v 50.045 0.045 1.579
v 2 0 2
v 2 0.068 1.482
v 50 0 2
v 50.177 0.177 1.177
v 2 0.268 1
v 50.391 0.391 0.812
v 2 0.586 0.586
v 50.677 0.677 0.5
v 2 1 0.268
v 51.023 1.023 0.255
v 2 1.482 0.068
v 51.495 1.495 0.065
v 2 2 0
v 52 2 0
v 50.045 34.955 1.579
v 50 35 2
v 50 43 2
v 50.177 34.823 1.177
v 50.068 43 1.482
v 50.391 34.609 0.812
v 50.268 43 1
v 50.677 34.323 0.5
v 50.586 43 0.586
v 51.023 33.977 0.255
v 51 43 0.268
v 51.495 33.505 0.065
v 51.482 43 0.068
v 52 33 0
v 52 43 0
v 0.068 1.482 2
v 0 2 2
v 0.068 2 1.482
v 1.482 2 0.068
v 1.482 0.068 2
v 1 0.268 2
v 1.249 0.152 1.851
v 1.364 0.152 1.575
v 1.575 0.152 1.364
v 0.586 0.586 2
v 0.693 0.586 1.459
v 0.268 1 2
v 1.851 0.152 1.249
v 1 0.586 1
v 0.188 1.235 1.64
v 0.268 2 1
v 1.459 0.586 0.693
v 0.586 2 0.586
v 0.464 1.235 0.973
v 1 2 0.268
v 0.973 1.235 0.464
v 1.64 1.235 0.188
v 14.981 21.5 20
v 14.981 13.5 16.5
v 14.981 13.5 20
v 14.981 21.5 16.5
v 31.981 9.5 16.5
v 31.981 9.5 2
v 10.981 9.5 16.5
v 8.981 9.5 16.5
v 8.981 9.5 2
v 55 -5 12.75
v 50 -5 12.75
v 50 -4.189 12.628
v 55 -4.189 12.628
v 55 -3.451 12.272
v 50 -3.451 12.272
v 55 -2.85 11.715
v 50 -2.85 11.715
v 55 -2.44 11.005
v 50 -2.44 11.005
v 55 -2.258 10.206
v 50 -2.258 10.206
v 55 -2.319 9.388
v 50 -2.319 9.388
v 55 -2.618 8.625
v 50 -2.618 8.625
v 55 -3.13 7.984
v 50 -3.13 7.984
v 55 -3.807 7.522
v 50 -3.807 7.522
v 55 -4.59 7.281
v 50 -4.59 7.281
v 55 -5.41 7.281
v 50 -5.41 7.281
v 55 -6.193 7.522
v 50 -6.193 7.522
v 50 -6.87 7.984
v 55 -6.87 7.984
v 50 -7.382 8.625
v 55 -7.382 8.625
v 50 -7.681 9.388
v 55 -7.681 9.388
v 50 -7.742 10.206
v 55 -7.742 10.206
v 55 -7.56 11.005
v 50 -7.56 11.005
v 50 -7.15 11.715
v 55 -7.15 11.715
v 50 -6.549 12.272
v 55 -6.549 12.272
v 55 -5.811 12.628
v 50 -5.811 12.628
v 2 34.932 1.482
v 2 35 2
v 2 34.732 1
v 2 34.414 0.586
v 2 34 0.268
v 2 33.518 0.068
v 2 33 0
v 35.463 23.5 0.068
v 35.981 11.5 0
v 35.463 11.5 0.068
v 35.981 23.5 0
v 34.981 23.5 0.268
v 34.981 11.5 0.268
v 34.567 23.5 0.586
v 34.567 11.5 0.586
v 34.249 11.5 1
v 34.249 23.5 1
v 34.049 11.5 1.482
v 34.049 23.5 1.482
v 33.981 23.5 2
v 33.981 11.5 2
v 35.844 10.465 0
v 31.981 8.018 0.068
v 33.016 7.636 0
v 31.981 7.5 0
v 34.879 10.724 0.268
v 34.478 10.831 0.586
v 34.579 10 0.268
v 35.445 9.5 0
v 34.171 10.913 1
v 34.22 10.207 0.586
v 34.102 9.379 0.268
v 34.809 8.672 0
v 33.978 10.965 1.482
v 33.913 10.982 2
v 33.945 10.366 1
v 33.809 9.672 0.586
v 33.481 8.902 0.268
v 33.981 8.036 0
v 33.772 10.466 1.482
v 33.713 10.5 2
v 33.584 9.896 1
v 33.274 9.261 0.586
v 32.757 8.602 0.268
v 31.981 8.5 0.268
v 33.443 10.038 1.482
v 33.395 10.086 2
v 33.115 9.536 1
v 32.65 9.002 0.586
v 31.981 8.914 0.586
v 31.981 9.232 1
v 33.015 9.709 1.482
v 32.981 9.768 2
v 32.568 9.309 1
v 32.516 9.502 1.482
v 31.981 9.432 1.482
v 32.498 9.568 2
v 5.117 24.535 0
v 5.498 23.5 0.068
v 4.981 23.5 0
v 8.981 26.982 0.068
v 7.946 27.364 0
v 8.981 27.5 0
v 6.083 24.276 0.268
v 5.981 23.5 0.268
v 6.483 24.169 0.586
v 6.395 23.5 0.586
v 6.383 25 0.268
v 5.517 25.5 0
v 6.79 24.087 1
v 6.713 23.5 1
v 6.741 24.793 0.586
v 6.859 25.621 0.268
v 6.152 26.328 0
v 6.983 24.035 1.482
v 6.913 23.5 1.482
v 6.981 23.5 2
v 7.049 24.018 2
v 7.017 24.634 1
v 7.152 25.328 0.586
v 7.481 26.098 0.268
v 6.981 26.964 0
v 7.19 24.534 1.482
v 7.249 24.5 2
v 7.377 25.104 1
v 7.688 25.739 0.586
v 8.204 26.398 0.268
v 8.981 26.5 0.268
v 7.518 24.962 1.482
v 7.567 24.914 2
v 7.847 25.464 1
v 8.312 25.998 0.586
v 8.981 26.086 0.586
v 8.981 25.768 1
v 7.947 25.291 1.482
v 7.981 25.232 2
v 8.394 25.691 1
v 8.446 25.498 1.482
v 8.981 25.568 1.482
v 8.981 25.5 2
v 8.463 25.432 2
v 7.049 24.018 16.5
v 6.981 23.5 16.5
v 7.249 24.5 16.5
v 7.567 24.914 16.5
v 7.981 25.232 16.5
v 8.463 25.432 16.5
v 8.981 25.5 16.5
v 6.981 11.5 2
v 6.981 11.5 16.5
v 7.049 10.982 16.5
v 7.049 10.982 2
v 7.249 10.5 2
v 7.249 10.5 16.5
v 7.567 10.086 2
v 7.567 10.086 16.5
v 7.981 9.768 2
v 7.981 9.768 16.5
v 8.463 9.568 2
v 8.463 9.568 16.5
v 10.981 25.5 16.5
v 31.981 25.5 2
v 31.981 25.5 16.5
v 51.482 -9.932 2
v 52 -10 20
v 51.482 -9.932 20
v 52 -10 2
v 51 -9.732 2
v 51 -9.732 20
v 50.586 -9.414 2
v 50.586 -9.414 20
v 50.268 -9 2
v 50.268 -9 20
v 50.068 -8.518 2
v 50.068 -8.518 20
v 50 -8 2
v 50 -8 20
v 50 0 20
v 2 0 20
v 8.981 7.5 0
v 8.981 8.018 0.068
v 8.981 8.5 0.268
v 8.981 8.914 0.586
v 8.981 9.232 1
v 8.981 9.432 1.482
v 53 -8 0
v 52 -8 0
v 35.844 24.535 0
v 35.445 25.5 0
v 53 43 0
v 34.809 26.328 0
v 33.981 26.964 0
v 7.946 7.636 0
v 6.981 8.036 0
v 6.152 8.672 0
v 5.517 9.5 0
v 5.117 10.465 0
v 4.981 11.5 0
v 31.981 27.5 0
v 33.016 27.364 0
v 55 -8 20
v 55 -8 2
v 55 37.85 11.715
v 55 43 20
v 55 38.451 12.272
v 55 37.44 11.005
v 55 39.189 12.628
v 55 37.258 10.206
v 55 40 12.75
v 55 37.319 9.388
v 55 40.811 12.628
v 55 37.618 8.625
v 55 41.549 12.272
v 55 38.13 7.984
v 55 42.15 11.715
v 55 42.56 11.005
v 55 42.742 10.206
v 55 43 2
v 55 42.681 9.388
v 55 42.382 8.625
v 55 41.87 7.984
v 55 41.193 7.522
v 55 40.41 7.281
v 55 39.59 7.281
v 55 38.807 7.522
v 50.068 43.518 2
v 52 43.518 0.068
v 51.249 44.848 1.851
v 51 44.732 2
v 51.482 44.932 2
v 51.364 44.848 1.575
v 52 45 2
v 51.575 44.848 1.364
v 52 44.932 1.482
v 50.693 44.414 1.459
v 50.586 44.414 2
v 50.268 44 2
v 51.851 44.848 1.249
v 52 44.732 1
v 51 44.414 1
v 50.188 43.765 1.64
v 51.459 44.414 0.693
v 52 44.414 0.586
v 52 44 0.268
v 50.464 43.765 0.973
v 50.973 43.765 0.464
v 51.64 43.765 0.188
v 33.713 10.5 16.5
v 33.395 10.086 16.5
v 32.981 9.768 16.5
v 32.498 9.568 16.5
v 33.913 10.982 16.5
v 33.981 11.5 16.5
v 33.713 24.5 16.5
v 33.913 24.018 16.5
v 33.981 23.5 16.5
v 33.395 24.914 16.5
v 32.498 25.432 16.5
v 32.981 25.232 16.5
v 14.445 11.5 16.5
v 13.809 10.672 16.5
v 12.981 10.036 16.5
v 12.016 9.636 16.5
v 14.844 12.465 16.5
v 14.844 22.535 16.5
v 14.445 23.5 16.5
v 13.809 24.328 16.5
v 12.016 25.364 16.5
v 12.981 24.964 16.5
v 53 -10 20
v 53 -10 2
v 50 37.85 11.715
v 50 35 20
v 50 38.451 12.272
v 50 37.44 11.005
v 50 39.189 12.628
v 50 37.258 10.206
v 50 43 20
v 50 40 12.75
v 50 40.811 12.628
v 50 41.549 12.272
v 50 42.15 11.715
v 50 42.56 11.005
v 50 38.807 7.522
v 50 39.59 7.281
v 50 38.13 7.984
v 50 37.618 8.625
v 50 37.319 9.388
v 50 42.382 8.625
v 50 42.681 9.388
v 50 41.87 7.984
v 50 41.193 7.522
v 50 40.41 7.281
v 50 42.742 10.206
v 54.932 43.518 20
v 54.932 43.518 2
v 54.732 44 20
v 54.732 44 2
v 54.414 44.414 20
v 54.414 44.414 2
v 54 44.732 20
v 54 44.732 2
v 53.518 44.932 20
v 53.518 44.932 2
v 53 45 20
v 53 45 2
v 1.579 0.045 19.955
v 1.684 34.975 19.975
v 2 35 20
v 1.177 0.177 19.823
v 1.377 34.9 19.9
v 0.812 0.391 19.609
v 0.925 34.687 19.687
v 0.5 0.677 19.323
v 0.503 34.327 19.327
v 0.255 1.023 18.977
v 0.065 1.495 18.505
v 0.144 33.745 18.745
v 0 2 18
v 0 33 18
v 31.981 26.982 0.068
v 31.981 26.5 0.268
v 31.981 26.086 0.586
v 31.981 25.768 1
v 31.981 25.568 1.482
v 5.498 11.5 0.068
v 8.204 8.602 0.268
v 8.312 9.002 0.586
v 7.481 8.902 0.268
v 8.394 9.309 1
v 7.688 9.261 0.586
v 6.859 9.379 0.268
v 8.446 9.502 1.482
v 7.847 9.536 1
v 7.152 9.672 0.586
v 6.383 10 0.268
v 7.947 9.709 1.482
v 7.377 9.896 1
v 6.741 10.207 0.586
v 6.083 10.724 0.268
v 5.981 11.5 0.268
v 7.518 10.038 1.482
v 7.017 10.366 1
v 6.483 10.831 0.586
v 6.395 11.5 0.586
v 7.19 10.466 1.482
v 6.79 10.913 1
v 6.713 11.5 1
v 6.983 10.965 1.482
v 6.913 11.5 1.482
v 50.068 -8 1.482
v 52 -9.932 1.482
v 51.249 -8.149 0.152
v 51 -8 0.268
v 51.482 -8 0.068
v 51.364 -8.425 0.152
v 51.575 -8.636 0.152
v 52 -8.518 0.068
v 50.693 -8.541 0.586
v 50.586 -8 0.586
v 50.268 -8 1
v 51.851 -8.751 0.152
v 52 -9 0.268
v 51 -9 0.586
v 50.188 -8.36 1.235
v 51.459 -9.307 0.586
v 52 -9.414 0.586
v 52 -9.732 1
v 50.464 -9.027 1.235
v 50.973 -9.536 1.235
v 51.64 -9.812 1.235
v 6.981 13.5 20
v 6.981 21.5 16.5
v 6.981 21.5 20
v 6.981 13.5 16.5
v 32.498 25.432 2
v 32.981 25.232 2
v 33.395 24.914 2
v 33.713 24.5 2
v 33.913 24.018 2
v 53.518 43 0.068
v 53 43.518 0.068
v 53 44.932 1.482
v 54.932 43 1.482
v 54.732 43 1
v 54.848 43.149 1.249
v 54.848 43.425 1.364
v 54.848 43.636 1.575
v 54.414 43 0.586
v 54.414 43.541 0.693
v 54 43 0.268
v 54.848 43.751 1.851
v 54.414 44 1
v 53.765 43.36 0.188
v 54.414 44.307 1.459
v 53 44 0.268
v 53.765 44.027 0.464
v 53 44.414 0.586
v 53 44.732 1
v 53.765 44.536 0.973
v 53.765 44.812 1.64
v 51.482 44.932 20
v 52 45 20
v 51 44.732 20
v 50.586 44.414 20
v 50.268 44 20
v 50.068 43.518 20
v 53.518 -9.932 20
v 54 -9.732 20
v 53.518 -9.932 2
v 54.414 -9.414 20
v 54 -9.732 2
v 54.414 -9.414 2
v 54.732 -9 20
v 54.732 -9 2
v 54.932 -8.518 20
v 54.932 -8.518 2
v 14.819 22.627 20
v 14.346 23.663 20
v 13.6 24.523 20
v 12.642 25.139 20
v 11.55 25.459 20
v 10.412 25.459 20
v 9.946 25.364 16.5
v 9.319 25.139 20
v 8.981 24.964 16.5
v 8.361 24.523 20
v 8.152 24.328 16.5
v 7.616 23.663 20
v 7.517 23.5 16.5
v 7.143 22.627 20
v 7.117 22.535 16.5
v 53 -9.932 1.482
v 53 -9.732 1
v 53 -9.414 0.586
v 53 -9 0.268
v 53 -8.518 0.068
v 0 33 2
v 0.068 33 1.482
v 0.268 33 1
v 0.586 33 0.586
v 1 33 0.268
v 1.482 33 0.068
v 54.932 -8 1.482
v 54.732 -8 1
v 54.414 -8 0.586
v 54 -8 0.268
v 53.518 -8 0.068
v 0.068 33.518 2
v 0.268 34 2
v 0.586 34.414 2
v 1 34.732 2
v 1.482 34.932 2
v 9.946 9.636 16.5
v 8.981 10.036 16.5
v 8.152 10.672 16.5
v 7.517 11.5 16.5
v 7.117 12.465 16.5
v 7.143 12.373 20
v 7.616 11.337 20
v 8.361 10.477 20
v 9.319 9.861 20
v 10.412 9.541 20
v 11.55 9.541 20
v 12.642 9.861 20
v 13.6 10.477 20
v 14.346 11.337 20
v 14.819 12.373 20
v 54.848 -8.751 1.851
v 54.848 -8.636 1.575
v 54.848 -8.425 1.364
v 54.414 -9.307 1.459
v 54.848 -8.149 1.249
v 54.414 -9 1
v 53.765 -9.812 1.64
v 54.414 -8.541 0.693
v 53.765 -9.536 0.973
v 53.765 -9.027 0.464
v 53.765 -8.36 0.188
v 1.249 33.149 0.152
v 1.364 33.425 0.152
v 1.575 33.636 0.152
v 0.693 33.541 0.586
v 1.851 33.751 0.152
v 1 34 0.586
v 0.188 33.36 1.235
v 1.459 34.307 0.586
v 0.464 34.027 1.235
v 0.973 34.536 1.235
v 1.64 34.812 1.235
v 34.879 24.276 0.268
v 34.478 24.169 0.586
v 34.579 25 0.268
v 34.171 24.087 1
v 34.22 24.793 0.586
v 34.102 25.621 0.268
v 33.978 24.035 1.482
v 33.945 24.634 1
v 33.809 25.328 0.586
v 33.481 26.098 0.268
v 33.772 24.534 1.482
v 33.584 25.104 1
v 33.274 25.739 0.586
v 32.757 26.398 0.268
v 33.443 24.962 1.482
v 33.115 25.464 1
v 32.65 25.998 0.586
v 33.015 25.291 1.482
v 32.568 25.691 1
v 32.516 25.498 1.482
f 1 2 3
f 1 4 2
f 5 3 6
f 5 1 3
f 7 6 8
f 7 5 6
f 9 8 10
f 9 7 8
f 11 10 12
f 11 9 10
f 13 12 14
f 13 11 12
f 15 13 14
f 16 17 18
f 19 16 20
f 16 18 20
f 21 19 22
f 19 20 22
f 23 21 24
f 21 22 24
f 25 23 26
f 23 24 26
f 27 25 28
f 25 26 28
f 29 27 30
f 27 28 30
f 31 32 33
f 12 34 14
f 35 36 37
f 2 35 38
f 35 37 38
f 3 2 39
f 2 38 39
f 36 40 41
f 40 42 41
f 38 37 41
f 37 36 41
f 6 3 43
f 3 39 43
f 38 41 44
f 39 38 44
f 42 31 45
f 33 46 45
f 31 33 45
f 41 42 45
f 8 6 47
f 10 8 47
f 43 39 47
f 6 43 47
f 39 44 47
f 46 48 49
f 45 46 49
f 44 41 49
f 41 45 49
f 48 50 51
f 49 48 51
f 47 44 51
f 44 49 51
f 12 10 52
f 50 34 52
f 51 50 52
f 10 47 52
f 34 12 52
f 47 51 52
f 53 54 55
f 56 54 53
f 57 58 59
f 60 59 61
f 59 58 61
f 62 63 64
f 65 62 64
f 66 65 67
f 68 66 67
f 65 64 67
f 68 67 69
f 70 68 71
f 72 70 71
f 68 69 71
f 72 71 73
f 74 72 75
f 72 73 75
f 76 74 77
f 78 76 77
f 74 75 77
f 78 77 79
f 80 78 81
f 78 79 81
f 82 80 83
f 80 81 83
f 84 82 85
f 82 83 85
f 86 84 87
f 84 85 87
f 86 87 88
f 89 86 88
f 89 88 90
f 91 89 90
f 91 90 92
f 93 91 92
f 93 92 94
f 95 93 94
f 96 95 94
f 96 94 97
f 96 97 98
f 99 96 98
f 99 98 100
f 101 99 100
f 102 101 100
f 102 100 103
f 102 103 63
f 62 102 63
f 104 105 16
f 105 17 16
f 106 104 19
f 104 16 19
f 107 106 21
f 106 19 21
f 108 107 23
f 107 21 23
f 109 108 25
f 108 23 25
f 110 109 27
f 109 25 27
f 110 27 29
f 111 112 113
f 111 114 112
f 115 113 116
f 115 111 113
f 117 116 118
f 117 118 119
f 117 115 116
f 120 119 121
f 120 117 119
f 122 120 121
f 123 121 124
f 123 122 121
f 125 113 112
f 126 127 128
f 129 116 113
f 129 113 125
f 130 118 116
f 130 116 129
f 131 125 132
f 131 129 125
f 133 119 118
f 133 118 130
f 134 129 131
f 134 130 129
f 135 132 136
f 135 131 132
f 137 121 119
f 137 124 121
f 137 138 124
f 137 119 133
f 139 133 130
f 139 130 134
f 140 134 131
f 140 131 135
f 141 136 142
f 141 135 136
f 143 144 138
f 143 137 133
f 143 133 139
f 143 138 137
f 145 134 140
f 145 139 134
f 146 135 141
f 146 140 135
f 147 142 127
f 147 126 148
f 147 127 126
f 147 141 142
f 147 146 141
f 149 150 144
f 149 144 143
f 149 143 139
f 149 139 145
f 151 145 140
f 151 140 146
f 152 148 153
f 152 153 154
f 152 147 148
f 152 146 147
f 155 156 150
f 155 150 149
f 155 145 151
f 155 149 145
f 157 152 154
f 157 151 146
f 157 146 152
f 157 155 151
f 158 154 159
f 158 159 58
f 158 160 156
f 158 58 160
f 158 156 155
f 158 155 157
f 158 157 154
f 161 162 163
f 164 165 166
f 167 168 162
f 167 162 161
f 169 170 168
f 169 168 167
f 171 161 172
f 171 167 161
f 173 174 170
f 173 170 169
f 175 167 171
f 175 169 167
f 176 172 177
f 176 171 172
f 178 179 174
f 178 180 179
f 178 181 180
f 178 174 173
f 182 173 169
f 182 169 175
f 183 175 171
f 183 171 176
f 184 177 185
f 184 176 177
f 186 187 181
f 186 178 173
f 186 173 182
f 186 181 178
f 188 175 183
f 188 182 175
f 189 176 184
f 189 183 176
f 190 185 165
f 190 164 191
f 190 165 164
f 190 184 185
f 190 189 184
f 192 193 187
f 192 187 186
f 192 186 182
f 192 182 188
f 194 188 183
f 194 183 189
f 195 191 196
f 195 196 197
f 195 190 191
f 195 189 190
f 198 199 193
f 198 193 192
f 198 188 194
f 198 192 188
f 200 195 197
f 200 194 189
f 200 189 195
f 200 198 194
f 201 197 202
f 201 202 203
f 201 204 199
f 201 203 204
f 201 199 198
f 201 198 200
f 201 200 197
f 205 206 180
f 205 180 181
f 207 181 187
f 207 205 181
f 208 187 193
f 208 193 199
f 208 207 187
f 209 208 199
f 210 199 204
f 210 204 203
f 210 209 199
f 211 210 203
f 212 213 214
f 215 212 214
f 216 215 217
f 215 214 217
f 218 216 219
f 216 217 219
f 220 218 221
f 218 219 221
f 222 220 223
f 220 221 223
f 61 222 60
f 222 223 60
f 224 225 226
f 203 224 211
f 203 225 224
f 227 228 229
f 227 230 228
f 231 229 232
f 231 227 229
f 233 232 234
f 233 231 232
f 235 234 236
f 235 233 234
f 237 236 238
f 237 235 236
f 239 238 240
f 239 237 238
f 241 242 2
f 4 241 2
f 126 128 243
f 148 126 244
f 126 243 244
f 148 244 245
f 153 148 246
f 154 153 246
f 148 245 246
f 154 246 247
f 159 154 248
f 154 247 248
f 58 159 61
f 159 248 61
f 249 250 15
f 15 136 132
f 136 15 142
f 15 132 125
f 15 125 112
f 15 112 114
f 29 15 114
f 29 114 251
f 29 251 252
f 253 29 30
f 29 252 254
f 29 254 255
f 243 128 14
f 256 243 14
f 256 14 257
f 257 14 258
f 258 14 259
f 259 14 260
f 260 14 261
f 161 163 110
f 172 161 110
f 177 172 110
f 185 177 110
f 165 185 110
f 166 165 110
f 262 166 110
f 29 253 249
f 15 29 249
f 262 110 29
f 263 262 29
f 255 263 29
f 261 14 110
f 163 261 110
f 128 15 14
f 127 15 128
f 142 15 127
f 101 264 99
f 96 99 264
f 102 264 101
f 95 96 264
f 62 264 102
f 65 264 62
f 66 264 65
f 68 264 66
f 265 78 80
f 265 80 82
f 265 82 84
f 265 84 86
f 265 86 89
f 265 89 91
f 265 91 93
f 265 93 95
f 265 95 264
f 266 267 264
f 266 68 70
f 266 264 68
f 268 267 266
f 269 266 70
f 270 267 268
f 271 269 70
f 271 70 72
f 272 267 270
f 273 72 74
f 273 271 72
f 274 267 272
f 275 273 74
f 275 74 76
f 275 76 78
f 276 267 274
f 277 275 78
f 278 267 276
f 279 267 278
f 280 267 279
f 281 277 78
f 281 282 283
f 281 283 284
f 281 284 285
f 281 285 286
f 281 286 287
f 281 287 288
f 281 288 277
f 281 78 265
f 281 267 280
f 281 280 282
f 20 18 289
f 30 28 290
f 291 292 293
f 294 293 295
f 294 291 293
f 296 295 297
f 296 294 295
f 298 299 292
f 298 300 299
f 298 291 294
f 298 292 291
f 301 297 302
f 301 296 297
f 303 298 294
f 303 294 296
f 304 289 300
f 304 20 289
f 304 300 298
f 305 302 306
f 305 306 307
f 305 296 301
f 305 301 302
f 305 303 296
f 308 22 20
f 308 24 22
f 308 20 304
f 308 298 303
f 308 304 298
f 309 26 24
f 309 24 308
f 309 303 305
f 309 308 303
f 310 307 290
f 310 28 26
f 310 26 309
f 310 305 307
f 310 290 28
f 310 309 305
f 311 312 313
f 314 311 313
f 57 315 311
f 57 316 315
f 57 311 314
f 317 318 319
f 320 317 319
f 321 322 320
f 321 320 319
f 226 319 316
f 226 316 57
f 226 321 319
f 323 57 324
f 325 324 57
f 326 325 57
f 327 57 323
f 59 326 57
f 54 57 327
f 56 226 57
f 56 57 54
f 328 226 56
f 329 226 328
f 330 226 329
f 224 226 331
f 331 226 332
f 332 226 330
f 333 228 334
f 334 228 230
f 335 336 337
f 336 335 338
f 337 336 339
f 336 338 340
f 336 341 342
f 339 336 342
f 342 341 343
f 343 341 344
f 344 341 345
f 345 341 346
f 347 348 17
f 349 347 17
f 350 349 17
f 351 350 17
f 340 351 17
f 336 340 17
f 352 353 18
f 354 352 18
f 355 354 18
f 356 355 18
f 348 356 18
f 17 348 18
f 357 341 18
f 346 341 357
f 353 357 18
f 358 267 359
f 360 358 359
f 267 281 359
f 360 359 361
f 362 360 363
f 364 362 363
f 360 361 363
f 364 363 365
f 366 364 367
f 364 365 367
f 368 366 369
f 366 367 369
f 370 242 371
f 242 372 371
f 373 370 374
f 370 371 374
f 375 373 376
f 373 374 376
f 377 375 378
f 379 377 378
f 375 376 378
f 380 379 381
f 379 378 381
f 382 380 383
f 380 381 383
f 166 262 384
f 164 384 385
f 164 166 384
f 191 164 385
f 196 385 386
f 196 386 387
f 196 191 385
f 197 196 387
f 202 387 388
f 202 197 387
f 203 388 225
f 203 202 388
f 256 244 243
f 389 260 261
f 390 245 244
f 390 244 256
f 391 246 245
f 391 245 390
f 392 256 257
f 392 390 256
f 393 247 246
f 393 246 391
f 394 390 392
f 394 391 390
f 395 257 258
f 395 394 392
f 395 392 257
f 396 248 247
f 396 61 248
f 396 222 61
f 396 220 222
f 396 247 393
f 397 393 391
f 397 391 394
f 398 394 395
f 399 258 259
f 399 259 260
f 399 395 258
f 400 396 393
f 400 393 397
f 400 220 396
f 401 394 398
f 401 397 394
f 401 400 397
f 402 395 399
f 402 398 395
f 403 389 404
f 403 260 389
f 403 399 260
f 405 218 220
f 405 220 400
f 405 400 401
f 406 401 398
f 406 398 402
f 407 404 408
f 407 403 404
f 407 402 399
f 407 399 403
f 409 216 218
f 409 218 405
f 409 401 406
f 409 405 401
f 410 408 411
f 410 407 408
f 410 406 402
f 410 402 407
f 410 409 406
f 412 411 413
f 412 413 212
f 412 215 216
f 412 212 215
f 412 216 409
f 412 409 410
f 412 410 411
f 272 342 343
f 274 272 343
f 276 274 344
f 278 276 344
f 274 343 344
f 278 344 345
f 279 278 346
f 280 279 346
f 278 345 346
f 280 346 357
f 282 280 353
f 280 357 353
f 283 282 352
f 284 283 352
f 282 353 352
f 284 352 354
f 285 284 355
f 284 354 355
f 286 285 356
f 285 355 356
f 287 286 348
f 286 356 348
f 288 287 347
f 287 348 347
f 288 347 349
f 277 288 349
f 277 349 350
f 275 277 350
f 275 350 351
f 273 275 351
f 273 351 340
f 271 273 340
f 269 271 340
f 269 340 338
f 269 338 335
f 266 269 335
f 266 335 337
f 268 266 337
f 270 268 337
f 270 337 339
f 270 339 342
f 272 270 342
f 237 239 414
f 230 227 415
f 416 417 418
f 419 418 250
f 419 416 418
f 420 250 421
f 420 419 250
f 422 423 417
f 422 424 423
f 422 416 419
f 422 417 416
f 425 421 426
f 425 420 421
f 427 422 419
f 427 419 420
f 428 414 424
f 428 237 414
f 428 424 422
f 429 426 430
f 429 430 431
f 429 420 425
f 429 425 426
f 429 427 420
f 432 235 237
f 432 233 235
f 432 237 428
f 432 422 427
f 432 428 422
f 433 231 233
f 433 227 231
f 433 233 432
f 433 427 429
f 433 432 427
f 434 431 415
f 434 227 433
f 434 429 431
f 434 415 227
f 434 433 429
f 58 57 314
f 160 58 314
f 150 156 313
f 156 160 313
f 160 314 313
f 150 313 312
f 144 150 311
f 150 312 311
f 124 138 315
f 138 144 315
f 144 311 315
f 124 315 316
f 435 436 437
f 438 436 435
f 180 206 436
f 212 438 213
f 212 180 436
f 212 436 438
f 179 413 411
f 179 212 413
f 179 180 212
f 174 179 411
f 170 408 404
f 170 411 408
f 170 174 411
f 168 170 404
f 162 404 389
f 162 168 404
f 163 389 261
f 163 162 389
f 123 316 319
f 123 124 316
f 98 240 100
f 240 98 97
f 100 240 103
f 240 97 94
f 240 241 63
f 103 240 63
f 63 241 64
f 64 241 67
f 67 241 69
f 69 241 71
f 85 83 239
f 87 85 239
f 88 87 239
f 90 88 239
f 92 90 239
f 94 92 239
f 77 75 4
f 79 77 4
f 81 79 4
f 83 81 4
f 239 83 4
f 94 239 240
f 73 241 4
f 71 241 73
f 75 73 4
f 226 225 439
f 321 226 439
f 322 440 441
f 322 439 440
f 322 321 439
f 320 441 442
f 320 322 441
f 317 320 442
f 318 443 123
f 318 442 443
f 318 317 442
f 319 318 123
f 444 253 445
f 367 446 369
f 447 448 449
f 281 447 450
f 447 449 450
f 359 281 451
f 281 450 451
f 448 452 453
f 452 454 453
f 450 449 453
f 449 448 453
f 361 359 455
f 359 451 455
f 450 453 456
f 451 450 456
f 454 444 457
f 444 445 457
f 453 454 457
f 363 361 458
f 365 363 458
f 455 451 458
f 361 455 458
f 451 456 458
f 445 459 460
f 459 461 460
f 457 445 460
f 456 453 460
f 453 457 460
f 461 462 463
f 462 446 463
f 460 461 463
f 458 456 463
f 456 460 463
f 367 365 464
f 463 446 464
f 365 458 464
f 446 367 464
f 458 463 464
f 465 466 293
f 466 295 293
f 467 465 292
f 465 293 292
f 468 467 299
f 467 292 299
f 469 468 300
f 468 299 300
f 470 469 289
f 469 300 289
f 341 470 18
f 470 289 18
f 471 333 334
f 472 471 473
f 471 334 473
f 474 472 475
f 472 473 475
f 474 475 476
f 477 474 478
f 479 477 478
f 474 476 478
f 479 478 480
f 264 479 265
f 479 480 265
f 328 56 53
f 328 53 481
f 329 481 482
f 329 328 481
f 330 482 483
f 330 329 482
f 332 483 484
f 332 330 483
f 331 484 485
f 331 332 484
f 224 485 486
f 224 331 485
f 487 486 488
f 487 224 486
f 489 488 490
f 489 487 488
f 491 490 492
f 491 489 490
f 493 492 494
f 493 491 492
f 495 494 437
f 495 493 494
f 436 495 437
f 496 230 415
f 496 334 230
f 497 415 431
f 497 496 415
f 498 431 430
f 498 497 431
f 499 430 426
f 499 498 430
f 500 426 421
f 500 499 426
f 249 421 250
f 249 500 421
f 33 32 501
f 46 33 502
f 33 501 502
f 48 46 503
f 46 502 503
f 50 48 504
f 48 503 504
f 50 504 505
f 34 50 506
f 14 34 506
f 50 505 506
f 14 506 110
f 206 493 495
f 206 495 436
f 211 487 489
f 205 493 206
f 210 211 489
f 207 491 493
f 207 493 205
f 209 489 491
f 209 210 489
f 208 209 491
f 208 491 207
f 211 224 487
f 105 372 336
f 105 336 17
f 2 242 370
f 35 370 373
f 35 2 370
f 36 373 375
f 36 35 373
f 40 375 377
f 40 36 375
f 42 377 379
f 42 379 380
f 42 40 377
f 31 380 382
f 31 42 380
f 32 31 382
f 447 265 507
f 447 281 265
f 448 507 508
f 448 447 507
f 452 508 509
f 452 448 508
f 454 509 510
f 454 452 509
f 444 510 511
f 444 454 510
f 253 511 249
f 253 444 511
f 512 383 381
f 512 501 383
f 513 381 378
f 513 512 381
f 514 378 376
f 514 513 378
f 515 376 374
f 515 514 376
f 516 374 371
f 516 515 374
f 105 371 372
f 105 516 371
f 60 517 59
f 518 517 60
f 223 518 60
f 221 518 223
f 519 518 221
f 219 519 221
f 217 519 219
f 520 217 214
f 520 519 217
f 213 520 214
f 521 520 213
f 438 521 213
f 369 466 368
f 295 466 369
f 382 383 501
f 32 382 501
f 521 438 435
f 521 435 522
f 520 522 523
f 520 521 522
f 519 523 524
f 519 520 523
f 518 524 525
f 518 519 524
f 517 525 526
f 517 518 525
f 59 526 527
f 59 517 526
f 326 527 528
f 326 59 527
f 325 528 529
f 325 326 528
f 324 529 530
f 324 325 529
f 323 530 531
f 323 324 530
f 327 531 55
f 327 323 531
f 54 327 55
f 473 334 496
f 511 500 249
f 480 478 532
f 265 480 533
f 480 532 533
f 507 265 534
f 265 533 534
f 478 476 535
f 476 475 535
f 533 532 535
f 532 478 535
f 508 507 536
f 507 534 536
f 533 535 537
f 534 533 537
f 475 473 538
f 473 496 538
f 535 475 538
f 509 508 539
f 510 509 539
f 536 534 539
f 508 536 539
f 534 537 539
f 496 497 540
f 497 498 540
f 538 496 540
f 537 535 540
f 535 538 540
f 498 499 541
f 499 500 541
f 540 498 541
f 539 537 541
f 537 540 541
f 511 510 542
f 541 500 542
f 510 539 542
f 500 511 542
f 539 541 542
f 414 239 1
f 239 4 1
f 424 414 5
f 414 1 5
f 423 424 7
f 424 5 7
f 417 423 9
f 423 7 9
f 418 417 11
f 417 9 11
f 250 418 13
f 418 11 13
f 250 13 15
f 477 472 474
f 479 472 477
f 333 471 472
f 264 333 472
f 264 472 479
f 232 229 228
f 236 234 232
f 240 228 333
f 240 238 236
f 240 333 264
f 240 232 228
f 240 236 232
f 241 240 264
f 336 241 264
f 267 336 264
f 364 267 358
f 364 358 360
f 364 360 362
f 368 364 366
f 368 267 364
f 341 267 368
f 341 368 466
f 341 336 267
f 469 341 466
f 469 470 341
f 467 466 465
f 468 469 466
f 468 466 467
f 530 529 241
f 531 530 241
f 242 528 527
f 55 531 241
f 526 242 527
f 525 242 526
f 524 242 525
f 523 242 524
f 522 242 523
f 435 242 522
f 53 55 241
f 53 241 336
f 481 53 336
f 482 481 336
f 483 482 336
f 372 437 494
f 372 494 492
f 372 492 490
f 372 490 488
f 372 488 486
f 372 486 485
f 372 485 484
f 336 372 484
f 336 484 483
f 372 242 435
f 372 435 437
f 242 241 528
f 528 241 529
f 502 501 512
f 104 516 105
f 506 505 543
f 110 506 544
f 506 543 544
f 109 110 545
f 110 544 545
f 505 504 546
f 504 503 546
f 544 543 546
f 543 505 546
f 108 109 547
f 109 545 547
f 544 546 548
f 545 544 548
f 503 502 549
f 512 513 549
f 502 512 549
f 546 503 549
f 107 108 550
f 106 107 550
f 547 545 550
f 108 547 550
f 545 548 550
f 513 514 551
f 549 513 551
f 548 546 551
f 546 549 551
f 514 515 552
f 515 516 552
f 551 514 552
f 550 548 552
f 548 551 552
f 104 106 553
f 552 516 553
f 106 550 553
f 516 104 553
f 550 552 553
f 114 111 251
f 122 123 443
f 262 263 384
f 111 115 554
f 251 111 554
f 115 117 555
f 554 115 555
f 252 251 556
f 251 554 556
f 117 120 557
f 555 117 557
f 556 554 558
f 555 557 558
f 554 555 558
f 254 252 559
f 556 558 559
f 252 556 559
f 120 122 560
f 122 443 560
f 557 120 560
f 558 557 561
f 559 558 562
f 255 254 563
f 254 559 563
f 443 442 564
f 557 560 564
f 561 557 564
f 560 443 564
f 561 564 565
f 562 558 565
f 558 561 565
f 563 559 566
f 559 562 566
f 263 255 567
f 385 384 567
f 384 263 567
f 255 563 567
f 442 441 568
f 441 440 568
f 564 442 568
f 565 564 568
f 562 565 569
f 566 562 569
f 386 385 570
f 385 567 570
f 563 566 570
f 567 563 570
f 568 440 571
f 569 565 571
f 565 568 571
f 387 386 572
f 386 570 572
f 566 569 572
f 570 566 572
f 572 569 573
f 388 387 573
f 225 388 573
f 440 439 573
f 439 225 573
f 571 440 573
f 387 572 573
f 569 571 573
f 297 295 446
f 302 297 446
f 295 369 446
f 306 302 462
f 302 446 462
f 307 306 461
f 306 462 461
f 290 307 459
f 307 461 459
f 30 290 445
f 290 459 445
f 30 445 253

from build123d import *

# Parameters (mm, degrees)
SKETCH1_W           = 20
SKETCH1_H           = 35
BOSS_EXTRUDE1_DEPTH = 50
SKETCH2_W           = 20
SKETCH2_H           = 55
BOSS_EXTRUDE2_DEPTH = 5
SKETCH3_W           = 27
SKETCH3_H           = 16
CUT_EXTRUDE1_DEPTH  = 16.5
CUT_EXTRUDE2_DEPTH  = 16.5
SKETCH5_R           = 2.75
CUT_EXTRUDE3_DEPTH  = 71.178344238
FILLET1_R           = 2


with BuildPart() as part:
    # Sketch1 → Boss-Extrude1 (new body)
    with BuildSketch(Plane(origin=(0, 0, 0), x_dir=(0, 0, -1), z_dir=(1, 0, 0))):
        with Locations((-10, 17.5)):
            Rectangle(SKETCH1_W, SKETCH1_H)
    extrude(amount=BOSS_EXTRUDE1_DEPTH)

    # Sketch2 → Boss-Extrude2 (add)
    with BuildSketch(Plane(origin=(50, 0, 0), x_dir=(0, 0, -1), z_dir=(1, 0, 0))):
        with Locations((-10, 17.5)):
            Rectangle(SKETCH2_W, SKETCH2_H)
    extrude(amount=BOSS_EXTRUDE2_DEPTH)

    # Sketch3 → Cut-Extrude1 (cut)
    with BuildSketch(Plane(origin=(0, 0, 0), x_dir=(-1, 0, 0), z_dir=(0, 0, -1))):
        with Locations((-20.480792353, 17.5)):
            Rectangle(SKETCH3_W, SKETCH3_H)
    extrude(amount=-CUT_EXTRUDE1_DEPTH, mode=Mode.SUBTRACT)

    # Sketch4 → Cut-Extrude2 (cut)
    with BuildSketch(Plane(origin=(0, 0, 16.5), x_dir=(-1, 0, 0), z_dir=(0, 0, -1))):
        with BuildLine():
            Line((-6.980792353, 21.5), (-6.980792353, 13.5))
            ThreePointArc((-6.980792353, 13.5), (-10.980792353, 9.5), (-14.980792353, 13.5))
            Line((-14.980792353, 13.5), (-14.980792353, 21.5))
            ThreePointArc((-14.980792353, 21.5), (-10.980792353, 25.5), (-6.980792353, 21.5))
        make_face()
    extrude(amount=-CUT_EXTRUDE2_DEPTH, mode=Mode.SUBTRACT)

    # Sketch5 → Cut-Extrude3 (cut, through all)
    with BuildSketch(Plane.ZY.offset(-50)):
        with Locations((10, 40)):
            Circle(SKETCH5_R)
        with Locations((10, -5)):
            Circle(SKETCH5_R)
    extrude(amount=-CUT_EXTRUDE3_DEPTH, mode=Mode.SUBTRACT)

    # Fillet1
    fillet1_edges = [part.edges().sort_by_distance(p)[0] for p in [
        (50, -10, 10),
        (50, -5, 0),
        (50, 40, 0),
        (52.5, -10, 0),
        (50, 45, 10),
        (52.5, 45, 0),
        (55, -10, 10),
        (55, 17.5, 0),
        (55, 45, 10),
        (33.980792353, 9.5, 8.25),
        (33.980792353, 25.5, 8.25),
        (6.980792353, 25.5, 8.25),
        (6.980792353, 9.5, 8.25),
        (33.980792353, 17.5, 0),
        (20.480792353, 9.5, 0),
        (6.980792353, 17.5, 0),
        (20.480792353, 25.5, 0),
        (0, 35, 10),
        (0, 17.5, 0),
        (0, 0, 10),
        (0, 17.5, 20),
        (25, 35, 0),
        (25, 0, 0),
    ]]
    fillet(fillet1_edges, radius=FILLET1_R)


solid = part.part
